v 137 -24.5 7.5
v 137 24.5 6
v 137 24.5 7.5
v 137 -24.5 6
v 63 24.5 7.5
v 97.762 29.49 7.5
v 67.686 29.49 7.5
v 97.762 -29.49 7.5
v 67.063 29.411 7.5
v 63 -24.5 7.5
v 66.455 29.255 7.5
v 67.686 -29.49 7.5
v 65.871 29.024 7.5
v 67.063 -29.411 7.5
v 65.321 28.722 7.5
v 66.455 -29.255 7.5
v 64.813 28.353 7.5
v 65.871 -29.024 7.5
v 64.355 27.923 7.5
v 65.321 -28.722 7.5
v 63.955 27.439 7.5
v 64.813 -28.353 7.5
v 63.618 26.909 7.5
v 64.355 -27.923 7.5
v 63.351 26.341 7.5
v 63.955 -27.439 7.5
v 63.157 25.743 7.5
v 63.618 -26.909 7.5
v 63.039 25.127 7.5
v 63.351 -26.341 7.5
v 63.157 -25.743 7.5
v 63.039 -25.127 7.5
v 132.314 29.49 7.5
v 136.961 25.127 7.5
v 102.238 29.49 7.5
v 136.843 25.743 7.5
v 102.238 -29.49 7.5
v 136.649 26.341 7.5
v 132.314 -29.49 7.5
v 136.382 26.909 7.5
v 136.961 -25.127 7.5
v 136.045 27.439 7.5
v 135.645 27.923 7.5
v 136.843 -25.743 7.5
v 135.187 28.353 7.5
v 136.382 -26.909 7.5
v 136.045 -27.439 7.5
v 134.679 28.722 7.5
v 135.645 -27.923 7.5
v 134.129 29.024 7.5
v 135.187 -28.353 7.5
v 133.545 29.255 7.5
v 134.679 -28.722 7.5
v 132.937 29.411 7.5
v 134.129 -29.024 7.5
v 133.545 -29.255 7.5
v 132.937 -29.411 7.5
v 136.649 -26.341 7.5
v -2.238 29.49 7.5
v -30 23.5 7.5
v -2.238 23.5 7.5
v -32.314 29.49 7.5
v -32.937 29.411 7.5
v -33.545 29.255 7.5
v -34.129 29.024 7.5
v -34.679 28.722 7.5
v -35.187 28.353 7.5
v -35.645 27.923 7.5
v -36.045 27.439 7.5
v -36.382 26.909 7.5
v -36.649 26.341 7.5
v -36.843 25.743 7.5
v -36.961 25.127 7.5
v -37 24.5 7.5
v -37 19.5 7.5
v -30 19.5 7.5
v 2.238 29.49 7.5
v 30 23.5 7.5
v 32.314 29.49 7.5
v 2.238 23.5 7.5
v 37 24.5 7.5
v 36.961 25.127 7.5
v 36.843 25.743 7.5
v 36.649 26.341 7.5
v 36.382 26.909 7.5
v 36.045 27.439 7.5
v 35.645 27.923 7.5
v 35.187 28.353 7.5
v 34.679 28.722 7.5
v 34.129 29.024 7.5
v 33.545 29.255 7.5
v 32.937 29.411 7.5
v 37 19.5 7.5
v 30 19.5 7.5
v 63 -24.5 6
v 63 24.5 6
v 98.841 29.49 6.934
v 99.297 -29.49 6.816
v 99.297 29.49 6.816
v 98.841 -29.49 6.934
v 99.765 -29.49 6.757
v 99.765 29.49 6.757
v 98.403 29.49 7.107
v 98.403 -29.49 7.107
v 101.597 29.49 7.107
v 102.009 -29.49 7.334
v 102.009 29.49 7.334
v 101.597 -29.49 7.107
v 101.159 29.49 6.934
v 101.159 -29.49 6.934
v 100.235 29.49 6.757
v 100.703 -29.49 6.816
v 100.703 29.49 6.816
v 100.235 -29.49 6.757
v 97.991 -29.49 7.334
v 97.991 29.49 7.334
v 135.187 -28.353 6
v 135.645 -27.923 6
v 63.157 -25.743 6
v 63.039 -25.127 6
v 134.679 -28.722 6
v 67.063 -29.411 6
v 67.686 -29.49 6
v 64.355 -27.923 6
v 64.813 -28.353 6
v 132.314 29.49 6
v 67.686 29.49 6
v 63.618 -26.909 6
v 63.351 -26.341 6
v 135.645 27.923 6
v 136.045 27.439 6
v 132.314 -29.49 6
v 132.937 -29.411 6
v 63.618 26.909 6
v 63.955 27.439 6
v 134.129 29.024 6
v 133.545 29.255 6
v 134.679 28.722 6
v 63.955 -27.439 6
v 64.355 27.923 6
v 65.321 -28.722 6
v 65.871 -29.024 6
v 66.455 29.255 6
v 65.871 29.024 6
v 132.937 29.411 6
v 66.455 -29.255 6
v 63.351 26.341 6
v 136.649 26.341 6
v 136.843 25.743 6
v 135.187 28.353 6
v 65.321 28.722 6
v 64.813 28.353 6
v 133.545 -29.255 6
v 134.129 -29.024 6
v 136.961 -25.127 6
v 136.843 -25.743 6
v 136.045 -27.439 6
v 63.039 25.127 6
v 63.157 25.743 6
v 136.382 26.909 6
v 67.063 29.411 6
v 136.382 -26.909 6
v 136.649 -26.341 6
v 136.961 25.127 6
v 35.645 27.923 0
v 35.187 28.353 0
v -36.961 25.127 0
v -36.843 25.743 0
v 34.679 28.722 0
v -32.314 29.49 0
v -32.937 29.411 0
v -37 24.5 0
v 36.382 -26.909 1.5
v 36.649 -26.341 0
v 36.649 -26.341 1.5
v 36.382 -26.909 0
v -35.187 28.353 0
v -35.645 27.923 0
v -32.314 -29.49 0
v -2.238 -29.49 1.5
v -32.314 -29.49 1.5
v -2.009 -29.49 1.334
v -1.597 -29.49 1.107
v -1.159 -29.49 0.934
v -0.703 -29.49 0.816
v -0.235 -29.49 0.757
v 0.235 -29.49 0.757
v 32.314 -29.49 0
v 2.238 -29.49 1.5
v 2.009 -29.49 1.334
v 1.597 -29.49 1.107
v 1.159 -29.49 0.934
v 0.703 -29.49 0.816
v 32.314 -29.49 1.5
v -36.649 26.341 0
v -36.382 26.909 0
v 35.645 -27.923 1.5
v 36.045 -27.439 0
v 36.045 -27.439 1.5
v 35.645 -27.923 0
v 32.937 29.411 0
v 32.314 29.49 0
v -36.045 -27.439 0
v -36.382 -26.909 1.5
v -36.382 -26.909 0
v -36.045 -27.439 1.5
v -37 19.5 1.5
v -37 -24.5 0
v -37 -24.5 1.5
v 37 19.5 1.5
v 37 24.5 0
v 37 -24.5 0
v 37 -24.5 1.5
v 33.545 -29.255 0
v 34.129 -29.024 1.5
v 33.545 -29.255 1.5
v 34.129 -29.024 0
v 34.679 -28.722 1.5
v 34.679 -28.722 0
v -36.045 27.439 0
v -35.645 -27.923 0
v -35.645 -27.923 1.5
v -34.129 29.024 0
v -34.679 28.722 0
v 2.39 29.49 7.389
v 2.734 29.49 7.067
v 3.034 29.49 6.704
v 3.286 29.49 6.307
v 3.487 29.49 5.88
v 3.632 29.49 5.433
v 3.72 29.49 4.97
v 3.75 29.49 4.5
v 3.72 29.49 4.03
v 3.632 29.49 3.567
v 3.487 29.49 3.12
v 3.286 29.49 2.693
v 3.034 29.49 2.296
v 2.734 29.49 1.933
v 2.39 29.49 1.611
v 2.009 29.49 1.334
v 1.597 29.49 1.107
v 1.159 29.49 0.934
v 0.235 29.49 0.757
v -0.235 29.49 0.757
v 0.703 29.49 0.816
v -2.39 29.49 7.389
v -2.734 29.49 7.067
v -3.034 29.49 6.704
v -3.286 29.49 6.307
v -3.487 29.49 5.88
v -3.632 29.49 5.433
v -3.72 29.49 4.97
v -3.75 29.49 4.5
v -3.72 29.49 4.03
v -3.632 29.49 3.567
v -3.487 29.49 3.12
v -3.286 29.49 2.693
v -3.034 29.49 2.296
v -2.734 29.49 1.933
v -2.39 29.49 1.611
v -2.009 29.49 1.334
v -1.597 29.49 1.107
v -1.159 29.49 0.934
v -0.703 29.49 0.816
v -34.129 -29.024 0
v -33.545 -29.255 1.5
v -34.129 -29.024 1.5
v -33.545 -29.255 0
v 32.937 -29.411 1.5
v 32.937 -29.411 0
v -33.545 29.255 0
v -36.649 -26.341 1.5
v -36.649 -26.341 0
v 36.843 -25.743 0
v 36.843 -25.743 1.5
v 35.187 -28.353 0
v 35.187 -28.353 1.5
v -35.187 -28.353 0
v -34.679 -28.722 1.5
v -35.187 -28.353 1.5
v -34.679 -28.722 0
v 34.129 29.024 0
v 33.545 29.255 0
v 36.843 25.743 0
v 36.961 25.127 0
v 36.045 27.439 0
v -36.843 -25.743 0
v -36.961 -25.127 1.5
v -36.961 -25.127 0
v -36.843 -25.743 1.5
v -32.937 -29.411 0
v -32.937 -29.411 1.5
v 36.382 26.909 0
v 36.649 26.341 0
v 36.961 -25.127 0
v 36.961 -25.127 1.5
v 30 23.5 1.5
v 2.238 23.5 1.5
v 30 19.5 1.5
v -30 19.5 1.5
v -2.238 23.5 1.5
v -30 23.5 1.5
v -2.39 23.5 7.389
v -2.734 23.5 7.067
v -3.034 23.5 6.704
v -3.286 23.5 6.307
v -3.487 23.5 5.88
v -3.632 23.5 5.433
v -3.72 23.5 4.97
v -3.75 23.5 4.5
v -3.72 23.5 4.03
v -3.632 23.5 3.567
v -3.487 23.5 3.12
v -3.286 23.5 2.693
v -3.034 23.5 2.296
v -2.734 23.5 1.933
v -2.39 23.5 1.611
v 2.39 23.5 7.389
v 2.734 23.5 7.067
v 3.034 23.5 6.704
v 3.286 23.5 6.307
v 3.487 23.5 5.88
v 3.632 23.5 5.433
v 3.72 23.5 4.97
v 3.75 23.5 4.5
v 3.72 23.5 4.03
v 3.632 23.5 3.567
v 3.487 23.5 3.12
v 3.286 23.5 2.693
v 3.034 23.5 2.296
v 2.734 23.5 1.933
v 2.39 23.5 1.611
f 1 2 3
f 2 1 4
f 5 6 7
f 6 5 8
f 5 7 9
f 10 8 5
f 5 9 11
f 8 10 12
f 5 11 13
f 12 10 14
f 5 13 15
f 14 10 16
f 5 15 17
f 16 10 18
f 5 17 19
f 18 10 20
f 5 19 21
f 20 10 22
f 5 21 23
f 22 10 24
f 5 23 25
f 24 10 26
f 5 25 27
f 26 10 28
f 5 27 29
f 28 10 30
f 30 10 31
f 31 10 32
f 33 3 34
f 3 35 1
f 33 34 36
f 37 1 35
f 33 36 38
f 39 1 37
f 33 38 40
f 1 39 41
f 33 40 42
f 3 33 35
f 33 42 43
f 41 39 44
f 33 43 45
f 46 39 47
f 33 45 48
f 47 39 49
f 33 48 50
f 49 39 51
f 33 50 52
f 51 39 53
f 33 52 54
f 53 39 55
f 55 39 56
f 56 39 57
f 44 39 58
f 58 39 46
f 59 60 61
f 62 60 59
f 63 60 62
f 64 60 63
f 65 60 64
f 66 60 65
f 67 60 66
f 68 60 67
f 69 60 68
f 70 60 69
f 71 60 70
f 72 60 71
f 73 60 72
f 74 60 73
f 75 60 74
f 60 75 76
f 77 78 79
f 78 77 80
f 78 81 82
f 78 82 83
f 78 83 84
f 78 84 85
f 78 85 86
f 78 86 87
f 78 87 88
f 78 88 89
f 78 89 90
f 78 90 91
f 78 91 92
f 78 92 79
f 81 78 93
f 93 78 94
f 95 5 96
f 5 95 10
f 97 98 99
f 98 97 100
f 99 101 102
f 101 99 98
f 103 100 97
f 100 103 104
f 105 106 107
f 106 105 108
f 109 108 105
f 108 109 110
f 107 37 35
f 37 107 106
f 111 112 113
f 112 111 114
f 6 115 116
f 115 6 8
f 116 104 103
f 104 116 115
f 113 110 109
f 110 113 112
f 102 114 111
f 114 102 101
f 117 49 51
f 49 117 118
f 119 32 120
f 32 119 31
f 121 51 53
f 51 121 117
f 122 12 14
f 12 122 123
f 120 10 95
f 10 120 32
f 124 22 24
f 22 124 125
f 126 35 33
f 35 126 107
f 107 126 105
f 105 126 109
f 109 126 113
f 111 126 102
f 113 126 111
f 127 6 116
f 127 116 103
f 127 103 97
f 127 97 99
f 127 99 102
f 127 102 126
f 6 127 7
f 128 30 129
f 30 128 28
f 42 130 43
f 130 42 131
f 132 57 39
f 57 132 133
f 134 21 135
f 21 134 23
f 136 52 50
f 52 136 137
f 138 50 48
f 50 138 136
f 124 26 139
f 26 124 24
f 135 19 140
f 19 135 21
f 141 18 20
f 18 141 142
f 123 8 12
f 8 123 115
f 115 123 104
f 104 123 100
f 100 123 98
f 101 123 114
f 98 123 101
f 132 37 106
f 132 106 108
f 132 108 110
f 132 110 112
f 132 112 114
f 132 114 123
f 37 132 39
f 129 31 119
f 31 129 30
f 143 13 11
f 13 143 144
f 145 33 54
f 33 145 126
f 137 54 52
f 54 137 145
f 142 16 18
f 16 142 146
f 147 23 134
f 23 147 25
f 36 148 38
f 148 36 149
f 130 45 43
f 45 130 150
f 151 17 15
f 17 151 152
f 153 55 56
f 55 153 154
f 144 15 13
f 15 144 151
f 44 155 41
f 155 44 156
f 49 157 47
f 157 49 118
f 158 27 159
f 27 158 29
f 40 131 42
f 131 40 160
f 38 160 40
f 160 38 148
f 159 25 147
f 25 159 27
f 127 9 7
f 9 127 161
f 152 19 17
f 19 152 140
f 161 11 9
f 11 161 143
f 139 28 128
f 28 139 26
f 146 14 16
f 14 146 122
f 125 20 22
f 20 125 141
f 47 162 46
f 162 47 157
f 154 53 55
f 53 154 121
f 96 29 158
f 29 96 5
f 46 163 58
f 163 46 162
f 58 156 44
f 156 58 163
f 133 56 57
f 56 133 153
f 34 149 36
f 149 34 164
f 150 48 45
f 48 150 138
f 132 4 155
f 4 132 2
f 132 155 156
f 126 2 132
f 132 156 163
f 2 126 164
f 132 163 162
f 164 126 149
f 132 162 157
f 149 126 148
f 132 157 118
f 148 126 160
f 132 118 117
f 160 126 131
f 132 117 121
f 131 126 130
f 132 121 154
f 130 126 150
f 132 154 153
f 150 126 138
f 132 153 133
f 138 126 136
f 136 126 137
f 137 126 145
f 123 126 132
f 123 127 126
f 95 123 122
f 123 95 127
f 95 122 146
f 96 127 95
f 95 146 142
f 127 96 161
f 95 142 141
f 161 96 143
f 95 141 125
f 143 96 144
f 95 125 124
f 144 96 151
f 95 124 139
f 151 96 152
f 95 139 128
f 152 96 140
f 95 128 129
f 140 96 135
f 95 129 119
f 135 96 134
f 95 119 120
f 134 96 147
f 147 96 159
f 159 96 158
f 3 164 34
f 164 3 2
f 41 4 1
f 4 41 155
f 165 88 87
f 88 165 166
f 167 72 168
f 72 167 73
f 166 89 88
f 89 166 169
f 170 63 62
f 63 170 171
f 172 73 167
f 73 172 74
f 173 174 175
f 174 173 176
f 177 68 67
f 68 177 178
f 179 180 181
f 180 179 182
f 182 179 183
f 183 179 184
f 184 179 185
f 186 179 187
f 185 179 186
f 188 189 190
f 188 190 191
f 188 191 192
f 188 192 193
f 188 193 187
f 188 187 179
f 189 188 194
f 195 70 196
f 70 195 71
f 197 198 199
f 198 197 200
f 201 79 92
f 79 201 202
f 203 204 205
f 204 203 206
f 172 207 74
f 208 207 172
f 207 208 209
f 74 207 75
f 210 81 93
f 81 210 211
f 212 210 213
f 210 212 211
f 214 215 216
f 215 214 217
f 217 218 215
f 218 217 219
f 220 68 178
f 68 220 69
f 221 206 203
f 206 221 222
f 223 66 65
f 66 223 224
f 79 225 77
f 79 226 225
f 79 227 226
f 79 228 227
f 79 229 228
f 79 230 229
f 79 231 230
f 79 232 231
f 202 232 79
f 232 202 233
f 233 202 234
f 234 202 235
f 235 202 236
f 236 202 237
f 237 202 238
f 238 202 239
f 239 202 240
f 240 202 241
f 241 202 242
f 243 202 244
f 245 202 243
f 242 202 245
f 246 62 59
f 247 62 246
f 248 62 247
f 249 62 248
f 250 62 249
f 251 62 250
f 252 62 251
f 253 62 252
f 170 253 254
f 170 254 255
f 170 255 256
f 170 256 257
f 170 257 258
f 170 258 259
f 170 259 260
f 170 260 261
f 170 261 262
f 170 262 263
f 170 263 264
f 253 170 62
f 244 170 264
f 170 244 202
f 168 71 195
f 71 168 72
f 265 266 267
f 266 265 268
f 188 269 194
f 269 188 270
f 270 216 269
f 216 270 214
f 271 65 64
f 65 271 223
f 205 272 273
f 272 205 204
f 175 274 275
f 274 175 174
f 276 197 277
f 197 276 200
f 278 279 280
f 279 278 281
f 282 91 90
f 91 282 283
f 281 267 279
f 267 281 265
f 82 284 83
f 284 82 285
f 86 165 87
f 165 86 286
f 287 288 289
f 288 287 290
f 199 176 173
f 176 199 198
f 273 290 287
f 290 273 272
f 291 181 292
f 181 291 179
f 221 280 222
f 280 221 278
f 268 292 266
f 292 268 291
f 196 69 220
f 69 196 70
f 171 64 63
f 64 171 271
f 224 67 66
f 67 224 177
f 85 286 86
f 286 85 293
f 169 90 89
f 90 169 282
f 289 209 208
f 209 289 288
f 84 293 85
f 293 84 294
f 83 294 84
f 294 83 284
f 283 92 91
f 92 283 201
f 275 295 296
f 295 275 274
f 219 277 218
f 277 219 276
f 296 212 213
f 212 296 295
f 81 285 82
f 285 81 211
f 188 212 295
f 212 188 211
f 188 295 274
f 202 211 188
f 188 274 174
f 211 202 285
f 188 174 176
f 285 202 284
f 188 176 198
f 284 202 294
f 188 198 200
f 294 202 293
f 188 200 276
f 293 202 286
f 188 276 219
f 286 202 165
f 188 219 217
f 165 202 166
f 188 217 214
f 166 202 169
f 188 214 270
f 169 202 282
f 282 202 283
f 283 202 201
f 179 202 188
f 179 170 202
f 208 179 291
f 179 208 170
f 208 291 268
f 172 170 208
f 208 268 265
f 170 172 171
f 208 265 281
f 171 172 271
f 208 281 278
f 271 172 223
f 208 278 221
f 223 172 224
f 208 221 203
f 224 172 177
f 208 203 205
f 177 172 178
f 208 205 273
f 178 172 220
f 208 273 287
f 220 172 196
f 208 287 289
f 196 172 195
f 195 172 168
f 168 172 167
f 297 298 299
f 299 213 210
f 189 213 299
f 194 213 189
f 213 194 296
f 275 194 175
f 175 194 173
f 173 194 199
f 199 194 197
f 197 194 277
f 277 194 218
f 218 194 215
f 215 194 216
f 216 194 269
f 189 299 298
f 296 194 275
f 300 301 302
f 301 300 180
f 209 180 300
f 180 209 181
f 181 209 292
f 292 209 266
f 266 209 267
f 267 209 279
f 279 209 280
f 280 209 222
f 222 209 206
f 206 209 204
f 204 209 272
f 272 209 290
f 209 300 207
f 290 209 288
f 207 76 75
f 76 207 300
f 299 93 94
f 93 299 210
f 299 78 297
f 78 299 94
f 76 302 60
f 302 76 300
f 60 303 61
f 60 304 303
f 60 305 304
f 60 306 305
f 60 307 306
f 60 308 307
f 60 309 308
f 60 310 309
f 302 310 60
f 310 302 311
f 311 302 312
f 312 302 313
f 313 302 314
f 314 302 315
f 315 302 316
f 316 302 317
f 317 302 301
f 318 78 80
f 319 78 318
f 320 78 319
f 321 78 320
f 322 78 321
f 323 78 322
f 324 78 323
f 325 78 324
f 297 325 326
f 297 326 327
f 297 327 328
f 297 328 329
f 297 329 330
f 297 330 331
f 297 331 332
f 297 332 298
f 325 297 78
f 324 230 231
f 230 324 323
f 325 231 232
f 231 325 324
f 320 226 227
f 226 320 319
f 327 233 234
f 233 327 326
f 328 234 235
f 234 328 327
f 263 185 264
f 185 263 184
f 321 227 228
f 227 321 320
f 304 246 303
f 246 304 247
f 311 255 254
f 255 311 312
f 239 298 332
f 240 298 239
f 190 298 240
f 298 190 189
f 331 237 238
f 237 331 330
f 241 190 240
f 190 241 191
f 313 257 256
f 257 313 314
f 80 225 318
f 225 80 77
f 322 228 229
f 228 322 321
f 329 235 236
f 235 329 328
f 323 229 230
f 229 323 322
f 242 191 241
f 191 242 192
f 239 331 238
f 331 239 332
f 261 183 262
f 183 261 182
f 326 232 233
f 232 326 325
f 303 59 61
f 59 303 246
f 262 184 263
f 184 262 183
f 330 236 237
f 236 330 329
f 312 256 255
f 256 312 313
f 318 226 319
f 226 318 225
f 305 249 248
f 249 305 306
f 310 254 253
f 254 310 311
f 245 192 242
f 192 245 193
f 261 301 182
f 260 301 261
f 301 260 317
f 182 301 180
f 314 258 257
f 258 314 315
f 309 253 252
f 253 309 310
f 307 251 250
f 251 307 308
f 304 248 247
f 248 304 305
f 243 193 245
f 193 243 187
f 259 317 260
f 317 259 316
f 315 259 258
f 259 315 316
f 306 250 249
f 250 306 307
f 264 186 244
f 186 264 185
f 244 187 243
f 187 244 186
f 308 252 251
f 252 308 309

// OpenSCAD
$fn = 50;


difference() {
	union() {
		translate(v = [100, 0, 15]) {
			rotate(a = [180, 0, 0]) {
				difference() {
					union() {
						hull() {
							translate(v = [-32.0000000000, 24.5000000000, 0]) {
								cylinder(h = 9, r = 5);
							}
							translate(v = [32.0000000000, 24.5000000000, 0]) {
								cylinder(h = 9, r = 5);
							}
							translate(v = [-32.0000000000, -24.5000000000, 0]) {
								cylinder(h = 9, r = 5);
							}
							translate(v = [32.0000000000, -24.5000000000, 0]) {
								cylinder(h = 9, r = 5);
							}
						}
					}
					union() {
						#translate(v = [-37.0000000000, -29.5000000000, 1.5000000000]) {
							cube(size = [74, 49, 6]);
						}
						#translate(v = [-30.0000000000, -29.5000000000, 1.5000000000]) {
							cube(size = [60, 53, 6]);
						}
						#translate(v = [0, 29.5000000000, 4.5000000000]) {
							rotate(a = [90, 0, 0]) {
								cylinder(h = 59, r = 3.7500000000);
							}
						}
					}
				}
			}
		}
		hull() {
			translate(v = [-32.0000000000, 24.5000000000, 0]) {
				cylinder(h = 9, r = 5);
			}
			translate(v = [32.0000000000, 24.5000000000, 0]) {
				cylinder(h = 9, r = 5);
			}
			translate(v = [-32.0000000000, -24.5000000000, 0]) {
				cylinder(h = 9, r = 5);
			}
			translate(v = [32.0000000000, -24.5000000000, 0]) {
				cylinder(h = 9, r = 5);
			}
		}
	}
	union() {
		#translate(v = [-37.0000000000, -29.5000000000, 1.5000000000]) {
			cube(size = [74, 49, 6]);
		}
		#translate(v = [-30.0000000000, -29.5000000000, 1.5000000000]) {
			cube(size = [60, 53, 6]);
		}
		#translate(v = [0, 29.5000000000, 4.5000000000]) {
			rotate(a = [90, 0, 0]) {
				cylinder(h = 59, r = 3.7500000000);
			}
		}
		translate(v = [-250.0000000000, -250.0000000000, 7.5000000000]) {
			cube(size = [500, 500, 500]);
		}
		translate(v = [-250.0000000000, -250.0000000000, 7.5000000000]) {
			cube(size = [500, 500, 500]);
		}
		translate(v = [-250.0000000000, -250.0000000000, 7.5000000000]) {
			cube(size = [500, 500, 500]);
		}
	}
}
